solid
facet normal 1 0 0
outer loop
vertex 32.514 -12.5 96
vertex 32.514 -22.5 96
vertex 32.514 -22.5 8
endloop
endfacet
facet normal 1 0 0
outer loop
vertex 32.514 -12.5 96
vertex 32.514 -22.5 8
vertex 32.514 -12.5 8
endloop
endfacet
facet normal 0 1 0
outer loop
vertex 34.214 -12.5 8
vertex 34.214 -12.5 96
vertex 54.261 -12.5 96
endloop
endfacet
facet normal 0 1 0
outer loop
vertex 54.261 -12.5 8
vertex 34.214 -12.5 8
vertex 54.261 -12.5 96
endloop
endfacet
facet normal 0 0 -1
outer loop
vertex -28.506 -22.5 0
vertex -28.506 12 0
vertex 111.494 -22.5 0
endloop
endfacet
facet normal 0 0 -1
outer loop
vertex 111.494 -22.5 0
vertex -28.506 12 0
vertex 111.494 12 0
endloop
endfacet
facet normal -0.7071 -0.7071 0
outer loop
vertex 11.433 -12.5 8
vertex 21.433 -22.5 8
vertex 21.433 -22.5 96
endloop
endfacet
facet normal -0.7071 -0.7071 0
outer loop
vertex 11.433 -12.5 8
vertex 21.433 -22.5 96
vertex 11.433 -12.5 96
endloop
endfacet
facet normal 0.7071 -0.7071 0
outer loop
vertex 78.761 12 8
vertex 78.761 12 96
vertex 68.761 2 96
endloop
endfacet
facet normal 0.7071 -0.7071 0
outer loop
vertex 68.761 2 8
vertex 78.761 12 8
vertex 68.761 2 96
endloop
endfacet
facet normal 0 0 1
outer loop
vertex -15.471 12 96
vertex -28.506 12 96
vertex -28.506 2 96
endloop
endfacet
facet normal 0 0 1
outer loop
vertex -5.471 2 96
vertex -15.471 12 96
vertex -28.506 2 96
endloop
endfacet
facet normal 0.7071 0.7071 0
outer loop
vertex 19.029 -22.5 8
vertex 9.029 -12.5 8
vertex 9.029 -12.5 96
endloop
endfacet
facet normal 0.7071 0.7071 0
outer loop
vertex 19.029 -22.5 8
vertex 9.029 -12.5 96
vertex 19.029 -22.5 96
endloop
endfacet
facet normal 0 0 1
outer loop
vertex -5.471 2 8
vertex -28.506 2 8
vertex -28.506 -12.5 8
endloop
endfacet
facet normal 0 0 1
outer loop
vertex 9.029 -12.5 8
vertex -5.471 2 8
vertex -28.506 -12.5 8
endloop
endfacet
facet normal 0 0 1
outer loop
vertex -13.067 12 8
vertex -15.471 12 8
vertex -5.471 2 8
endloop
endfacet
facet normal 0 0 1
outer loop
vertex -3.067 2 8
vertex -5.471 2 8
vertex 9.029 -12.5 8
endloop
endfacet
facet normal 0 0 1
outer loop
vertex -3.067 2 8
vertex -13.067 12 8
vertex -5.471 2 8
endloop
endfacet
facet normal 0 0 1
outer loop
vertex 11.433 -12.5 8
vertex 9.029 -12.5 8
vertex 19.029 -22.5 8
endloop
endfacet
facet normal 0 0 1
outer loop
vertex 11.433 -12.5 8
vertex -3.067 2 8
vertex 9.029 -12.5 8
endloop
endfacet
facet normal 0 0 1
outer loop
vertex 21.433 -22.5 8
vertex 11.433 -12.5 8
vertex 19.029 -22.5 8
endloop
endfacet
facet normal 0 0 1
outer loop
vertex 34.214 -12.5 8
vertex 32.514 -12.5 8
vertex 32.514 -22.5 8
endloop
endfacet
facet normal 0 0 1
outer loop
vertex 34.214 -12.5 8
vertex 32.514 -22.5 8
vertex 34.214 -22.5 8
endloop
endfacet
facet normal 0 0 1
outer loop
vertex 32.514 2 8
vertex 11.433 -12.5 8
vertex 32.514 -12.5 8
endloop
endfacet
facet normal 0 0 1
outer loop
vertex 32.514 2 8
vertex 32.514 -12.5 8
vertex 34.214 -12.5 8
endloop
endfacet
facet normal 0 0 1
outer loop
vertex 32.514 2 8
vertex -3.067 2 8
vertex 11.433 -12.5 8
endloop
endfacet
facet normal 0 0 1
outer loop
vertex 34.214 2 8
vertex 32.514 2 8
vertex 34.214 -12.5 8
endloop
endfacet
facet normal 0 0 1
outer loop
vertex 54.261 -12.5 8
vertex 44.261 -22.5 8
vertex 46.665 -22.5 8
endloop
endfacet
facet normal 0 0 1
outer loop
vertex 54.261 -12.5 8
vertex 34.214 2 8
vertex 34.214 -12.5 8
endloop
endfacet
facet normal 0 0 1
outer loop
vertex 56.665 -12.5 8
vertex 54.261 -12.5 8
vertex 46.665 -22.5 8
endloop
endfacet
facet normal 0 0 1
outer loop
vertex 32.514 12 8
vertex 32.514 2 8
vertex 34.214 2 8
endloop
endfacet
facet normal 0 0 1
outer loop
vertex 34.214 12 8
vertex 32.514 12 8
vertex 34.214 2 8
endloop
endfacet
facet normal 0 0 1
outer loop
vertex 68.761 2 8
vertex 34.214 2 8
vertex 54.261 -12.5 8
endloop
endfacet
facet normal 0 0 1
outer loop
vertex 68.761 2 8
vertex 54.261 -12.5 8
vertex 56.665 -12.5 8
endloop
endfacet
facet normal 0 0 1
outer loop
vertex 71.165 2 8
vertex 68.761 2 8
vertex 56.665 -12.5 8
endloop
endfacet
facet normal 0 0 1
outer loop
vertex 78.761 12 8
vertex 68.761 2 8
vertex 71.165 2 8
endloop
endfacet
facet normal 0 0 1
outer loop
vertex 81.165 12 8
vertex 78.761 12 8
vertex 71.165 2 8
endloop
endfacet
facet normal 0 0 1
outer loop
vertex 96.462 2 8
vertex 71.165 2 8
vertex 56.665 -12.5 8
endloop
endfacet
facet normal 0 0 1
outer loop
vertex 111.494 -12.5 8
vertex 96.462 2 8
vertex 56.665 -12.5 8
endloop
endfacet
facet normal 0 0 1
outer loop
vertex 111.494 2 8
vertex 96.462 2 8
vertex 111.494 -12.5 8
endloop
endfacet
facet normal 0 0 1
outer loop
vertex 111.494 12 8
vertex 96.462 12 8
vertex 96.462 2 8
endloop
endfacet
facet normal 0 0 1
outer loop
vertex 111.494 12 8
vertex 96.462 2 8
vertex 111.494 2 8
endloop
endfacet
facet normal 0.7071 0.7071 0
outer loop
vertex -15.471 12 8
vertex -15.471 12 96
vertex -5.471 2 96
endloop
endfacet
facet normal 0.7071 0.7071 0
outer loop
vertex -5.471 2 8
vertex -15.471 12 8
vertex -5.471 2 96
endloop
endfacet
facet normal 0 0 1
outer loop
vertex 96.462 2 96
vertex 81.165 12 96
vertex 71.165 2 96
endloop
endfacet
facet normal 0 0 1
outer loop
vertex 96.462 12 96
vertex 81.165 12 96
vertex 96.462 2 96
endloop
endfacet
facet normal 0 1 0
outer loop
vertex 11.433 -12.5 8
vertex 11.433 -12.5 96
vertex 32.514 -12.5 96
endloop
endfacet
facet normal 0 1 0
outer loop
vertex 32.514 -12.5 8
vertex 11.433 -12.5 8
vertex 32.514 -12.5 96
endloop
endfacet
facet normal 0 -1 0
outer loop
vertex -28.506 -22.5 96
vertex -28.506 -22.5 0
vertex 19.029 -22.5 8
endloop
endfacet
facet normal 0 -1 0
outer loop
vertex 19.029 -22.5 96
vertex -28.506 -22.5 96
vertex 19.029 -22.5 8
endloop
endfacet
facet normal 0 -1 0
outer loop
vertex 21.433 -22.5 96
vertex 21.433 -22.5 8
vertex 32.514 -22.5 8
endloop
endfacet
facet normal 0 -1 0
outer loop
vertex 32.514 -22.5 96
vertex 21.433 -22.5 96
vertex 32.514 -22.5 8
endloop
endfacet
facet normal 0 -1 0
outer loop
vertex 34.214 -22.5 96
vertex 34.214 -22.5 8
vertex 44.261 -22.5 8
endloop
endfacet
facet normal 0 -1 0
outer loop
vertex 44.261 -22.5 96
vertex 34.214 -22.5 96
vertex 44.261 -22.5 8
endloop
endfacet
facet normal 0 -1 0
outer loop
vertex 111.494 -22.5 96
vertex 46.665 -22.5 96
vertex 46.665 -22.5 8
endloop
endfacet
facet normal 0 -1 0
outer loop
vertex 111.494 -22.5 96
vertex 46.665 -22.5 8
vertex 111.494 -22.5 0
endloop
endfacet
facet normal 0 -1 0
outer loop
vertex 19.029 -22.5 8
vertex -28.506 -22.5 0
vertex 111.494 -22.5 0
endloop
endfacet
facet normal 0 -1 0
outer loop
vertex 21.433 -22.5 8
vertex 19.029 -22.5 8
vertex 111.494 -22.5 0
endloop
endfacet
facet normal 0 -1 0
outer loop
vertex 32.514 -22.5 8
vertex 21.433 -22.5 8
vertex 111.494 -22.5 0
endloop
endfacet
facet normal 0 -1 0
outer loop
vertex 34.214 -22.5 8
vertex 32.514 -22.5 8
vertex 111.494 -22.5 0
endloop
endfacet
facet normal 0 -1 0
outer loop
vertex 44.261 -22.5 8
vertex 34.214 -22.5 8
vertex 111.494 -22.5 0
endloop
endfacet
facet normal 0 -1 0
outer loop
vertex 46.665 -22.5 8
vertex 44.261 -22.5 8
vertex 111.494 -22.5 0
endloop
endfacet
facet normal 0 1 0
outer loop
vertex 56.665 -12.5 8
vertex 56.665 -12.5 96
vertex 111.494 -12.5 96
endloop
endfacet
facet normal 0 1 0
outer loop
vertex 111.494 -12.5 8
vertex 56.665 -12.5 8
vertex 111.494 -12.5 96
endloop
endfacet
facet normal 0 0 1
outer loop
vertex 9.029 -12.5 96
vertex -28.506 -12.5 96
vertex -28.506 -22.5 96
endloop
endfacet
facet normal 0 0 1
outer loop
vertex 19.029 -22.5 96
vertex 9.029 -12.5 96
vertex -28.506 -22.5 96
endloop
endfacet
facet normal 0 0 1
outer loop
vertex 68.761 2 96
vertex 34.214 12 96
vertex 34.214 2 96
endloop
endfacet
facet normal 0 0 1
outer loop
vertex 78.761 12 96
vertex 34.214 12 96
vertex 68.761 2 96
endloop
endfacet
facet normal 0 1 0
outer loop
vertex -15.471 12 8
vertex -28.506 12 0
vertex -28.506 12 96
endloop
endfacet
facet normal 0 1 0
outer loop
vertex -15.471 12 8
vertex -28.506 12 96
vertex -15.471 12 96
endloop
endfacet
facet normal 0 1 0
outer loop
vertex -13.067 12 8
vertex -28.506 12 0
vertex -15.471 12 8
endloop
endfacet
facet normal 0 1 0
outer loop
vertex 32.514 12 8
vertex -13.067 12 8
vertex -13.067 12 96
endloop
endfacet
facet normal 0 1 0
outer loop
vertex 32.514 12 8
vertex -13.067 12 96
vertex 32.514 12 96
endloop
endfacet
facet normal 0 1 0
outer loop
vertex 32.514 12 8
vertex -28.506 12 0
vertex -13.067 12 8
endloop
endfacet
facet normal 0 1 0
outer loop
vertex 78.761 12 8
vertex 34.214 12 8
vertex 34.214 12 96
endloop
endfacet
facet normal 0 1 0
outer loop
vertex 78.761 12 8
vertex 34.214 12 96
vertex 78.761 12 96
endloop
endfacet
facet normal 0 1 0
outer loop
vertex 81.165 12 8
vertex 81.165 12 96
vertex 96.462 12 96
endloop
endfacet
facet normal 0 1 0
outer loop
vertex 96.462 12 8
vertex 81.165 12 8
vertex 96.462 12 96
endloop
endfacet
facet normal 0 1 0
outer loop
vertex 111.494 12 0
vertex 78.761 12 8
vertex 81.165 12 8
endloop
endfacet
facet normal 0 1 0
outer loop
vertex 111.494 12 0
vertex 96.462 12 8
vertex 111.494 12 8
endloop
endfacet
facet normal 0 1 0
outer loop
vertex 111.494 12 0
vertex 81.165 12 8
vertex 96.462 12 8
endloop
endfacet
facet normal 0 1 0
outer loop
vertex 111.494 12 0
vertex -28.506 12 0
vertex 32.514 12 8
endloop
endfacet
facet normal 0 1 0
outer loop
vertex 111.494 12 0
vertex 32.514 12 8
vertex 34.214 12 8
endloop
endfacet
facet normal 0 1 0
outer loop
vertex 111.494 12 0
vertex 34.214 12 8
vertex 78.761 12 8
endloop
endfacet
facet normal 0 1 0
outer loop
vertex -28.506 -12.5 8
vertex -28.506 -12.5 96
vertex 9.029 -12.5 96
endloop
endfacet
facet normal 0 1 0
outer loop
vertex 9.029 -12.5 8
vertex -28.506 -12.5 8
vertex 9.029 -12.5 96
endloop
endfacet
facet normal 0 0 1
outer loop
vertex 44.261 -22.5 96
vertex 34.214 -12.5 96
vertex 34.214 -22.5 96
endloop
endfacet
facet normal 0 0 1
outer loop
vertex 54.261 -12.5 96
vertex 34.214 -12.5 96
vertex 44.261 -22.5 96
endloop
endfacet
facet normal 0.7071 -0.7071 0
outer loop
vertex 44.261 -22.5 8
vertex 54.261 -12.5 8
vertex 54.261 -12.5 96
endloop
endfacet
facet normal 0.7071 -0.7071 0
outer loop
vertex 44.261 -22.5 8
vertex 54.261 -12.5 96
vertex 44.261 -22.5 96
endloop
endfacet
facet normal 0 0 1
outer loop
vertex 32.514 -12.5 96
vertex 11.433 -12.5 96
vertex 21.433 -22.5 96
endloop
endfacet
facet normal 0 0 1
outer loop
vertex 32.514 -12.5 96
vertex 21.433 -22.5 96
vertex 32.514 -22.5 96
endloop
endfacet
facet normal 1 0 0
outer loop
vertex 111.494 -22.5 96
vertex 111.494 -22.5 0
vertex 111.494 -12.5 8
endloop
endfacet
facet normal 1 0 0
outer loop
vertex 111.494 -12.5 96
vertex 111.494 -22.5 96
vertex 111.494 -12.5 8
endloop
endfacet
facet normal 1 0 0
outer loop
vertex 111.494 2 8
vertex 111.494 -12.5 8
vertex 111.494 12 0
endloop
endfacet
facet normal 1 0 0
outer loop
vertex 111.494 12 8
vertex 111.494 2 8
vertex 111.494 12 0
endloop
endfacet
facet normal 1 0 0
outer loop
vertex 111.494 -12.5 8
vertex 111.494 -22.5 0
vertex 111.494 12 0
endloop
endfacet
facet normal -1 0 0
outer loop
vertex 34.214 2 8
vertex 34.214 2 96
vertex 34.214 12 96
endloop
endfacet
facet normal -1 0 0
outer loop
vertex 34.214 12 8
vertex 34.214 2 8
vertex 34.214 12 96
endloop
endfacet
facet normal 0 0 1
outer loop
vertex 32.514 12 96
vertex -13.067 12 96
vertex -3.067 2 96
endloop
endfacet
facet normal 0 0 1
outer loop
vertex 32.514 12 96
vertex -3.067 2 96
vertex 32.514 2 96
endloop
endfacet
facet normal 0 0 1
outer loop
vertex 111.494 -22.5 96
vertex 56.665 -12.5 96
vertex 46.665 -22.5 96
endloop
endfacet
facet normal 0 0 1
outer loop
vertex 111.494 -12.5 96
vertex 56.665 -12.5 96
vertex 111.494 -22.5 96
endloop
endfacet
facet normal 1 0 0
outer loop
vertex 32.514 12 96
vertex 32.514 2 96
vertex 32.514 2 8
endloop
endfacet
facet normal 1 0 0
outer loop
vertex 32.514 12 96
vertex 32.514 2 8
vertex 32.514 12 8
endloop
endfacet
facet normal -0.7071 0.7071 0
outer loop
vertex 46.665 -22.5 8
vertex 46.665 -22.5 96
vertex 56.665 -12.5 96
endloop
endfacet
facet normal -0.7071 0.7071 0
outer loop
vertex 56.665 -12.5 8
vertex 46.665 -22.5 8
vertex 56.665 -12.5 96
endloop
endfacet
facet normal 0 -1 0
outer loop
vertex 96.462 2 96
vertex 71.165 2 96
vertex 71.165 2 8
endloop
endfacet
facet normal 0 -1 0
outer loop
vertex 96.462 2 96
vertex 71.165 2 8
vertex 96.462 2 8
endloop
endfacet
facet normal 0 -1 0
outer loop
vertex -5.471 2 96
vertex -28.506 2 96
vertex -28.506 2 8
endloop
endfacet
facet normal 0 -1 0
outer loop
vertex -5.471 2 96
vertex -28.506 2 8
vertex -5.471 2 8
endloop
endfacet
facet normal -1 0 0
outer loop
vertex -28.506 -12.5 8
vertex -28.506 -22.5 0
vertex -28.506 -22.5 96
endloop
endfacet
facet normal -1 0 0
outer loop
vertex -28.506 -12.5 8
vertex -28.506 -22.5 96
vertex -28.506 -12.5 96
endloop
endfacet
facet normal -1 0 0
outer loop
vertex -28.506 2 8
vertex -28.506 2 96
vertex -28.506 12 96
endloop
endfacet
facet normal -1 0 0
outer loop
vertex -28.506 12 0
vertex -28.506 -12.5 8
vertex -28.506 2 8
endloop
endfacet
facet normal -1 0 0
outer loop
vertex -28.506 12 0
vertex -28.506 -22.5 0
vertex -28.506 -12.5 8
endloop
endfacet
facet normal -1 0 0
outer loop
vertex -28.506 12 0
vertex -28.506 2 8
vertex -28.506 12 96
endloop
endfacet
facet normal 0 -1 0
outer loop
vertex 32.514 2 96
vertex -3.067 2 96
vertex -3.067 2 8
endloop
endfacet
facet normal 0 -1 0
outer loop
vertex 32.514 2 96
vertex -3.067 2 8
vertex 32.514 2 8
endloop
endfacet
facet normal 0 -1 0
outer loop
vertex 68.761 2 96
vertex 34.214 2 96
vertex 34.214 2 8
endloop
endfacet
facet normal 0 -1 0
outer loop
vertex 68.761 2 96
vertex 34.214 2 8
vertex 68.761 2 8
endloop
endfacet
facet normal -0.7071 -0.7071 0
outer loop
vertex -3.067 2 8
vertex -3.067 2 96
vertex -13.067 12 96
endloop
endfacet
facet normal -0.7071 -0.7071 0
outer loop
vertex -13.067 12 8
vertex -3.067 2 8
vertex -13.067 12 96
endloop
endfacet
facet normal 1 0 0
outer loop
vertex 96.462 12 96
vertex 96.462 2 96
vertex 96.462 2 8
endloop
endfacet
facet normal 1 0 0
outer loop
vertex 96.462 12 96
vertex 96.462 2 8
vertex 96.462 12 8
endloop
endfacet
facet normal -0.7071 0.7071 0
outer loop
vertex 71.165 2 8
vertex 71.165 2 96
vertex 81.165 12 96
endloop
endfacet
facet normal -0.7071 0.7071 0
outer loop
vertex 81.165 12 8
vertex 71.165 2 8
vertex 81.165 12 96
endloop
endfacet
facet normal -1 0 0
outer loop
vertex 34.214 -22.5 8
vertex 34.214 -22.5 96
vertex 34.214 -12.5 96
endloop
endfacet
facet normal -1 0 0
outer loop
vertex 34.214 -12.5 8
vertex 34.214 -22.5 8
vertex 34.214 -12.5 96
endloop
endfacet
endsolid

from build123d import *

# Parameters (mm, degrees)
F0_W     = 140
F0_H     = 34.5
F1_DEPTH = 96
F2_W     = 140
F2_H     = 14.5
F3_DEPTH = 88
F4_W     = 1.7
F4_H     = 35.4929193519
F4_W_2   = 15.0318985057
F4_H_2   = 10
F5_DEPTH = 88


with BuildPart() as f1:
    # F0 (on Top) → F1 (new body)
    with BuildSketch(Plane.XY):
        with Locations((41.4941184592, -5.2499999292)):
            Rectangle(F0_W, F0_H)
    extrude(amount=F1_DEPTH)

    # F2 (on face) → F3 (cut)
    with BuildSketch(Plane.XY.offset(96)):
        with Locations((41.4941184592, -5.2499999292)):
            Rectangle(F2_W, F2_H)
    extrude(amount=-F3_DEPTH, mode=Mode.SUBTRACT)

    # F4 (on face) → F5 (cut)
    with BuildSketch(Plane.XY.offset(96)):
        Polygon((-13.0666754805, 12.0000000708), (-15.4708385365, 12.0000000708), (20.0220808154, -23.4929192811), (22.4262438715, -23.4929192811), align=None)
        Polygon((81.1649545925, 12.0000000708), (78.7607915364, 12.0000000708), (42.6027141511, -24.1580773145), (45.0068772072, -24.1580773145), align=None)
        with Locations((33.3644790113, -5.7464596052)):
            Rectangle(F4_W, F4_H)
        with Locations((103.9781692064, 7.0000000708)):
            Rectangle(F4_W_2, F4_H_2)
    extrude(amount=-F5_DEPTH, mode=Mode.SUBTRACT)


solid = f1.part
